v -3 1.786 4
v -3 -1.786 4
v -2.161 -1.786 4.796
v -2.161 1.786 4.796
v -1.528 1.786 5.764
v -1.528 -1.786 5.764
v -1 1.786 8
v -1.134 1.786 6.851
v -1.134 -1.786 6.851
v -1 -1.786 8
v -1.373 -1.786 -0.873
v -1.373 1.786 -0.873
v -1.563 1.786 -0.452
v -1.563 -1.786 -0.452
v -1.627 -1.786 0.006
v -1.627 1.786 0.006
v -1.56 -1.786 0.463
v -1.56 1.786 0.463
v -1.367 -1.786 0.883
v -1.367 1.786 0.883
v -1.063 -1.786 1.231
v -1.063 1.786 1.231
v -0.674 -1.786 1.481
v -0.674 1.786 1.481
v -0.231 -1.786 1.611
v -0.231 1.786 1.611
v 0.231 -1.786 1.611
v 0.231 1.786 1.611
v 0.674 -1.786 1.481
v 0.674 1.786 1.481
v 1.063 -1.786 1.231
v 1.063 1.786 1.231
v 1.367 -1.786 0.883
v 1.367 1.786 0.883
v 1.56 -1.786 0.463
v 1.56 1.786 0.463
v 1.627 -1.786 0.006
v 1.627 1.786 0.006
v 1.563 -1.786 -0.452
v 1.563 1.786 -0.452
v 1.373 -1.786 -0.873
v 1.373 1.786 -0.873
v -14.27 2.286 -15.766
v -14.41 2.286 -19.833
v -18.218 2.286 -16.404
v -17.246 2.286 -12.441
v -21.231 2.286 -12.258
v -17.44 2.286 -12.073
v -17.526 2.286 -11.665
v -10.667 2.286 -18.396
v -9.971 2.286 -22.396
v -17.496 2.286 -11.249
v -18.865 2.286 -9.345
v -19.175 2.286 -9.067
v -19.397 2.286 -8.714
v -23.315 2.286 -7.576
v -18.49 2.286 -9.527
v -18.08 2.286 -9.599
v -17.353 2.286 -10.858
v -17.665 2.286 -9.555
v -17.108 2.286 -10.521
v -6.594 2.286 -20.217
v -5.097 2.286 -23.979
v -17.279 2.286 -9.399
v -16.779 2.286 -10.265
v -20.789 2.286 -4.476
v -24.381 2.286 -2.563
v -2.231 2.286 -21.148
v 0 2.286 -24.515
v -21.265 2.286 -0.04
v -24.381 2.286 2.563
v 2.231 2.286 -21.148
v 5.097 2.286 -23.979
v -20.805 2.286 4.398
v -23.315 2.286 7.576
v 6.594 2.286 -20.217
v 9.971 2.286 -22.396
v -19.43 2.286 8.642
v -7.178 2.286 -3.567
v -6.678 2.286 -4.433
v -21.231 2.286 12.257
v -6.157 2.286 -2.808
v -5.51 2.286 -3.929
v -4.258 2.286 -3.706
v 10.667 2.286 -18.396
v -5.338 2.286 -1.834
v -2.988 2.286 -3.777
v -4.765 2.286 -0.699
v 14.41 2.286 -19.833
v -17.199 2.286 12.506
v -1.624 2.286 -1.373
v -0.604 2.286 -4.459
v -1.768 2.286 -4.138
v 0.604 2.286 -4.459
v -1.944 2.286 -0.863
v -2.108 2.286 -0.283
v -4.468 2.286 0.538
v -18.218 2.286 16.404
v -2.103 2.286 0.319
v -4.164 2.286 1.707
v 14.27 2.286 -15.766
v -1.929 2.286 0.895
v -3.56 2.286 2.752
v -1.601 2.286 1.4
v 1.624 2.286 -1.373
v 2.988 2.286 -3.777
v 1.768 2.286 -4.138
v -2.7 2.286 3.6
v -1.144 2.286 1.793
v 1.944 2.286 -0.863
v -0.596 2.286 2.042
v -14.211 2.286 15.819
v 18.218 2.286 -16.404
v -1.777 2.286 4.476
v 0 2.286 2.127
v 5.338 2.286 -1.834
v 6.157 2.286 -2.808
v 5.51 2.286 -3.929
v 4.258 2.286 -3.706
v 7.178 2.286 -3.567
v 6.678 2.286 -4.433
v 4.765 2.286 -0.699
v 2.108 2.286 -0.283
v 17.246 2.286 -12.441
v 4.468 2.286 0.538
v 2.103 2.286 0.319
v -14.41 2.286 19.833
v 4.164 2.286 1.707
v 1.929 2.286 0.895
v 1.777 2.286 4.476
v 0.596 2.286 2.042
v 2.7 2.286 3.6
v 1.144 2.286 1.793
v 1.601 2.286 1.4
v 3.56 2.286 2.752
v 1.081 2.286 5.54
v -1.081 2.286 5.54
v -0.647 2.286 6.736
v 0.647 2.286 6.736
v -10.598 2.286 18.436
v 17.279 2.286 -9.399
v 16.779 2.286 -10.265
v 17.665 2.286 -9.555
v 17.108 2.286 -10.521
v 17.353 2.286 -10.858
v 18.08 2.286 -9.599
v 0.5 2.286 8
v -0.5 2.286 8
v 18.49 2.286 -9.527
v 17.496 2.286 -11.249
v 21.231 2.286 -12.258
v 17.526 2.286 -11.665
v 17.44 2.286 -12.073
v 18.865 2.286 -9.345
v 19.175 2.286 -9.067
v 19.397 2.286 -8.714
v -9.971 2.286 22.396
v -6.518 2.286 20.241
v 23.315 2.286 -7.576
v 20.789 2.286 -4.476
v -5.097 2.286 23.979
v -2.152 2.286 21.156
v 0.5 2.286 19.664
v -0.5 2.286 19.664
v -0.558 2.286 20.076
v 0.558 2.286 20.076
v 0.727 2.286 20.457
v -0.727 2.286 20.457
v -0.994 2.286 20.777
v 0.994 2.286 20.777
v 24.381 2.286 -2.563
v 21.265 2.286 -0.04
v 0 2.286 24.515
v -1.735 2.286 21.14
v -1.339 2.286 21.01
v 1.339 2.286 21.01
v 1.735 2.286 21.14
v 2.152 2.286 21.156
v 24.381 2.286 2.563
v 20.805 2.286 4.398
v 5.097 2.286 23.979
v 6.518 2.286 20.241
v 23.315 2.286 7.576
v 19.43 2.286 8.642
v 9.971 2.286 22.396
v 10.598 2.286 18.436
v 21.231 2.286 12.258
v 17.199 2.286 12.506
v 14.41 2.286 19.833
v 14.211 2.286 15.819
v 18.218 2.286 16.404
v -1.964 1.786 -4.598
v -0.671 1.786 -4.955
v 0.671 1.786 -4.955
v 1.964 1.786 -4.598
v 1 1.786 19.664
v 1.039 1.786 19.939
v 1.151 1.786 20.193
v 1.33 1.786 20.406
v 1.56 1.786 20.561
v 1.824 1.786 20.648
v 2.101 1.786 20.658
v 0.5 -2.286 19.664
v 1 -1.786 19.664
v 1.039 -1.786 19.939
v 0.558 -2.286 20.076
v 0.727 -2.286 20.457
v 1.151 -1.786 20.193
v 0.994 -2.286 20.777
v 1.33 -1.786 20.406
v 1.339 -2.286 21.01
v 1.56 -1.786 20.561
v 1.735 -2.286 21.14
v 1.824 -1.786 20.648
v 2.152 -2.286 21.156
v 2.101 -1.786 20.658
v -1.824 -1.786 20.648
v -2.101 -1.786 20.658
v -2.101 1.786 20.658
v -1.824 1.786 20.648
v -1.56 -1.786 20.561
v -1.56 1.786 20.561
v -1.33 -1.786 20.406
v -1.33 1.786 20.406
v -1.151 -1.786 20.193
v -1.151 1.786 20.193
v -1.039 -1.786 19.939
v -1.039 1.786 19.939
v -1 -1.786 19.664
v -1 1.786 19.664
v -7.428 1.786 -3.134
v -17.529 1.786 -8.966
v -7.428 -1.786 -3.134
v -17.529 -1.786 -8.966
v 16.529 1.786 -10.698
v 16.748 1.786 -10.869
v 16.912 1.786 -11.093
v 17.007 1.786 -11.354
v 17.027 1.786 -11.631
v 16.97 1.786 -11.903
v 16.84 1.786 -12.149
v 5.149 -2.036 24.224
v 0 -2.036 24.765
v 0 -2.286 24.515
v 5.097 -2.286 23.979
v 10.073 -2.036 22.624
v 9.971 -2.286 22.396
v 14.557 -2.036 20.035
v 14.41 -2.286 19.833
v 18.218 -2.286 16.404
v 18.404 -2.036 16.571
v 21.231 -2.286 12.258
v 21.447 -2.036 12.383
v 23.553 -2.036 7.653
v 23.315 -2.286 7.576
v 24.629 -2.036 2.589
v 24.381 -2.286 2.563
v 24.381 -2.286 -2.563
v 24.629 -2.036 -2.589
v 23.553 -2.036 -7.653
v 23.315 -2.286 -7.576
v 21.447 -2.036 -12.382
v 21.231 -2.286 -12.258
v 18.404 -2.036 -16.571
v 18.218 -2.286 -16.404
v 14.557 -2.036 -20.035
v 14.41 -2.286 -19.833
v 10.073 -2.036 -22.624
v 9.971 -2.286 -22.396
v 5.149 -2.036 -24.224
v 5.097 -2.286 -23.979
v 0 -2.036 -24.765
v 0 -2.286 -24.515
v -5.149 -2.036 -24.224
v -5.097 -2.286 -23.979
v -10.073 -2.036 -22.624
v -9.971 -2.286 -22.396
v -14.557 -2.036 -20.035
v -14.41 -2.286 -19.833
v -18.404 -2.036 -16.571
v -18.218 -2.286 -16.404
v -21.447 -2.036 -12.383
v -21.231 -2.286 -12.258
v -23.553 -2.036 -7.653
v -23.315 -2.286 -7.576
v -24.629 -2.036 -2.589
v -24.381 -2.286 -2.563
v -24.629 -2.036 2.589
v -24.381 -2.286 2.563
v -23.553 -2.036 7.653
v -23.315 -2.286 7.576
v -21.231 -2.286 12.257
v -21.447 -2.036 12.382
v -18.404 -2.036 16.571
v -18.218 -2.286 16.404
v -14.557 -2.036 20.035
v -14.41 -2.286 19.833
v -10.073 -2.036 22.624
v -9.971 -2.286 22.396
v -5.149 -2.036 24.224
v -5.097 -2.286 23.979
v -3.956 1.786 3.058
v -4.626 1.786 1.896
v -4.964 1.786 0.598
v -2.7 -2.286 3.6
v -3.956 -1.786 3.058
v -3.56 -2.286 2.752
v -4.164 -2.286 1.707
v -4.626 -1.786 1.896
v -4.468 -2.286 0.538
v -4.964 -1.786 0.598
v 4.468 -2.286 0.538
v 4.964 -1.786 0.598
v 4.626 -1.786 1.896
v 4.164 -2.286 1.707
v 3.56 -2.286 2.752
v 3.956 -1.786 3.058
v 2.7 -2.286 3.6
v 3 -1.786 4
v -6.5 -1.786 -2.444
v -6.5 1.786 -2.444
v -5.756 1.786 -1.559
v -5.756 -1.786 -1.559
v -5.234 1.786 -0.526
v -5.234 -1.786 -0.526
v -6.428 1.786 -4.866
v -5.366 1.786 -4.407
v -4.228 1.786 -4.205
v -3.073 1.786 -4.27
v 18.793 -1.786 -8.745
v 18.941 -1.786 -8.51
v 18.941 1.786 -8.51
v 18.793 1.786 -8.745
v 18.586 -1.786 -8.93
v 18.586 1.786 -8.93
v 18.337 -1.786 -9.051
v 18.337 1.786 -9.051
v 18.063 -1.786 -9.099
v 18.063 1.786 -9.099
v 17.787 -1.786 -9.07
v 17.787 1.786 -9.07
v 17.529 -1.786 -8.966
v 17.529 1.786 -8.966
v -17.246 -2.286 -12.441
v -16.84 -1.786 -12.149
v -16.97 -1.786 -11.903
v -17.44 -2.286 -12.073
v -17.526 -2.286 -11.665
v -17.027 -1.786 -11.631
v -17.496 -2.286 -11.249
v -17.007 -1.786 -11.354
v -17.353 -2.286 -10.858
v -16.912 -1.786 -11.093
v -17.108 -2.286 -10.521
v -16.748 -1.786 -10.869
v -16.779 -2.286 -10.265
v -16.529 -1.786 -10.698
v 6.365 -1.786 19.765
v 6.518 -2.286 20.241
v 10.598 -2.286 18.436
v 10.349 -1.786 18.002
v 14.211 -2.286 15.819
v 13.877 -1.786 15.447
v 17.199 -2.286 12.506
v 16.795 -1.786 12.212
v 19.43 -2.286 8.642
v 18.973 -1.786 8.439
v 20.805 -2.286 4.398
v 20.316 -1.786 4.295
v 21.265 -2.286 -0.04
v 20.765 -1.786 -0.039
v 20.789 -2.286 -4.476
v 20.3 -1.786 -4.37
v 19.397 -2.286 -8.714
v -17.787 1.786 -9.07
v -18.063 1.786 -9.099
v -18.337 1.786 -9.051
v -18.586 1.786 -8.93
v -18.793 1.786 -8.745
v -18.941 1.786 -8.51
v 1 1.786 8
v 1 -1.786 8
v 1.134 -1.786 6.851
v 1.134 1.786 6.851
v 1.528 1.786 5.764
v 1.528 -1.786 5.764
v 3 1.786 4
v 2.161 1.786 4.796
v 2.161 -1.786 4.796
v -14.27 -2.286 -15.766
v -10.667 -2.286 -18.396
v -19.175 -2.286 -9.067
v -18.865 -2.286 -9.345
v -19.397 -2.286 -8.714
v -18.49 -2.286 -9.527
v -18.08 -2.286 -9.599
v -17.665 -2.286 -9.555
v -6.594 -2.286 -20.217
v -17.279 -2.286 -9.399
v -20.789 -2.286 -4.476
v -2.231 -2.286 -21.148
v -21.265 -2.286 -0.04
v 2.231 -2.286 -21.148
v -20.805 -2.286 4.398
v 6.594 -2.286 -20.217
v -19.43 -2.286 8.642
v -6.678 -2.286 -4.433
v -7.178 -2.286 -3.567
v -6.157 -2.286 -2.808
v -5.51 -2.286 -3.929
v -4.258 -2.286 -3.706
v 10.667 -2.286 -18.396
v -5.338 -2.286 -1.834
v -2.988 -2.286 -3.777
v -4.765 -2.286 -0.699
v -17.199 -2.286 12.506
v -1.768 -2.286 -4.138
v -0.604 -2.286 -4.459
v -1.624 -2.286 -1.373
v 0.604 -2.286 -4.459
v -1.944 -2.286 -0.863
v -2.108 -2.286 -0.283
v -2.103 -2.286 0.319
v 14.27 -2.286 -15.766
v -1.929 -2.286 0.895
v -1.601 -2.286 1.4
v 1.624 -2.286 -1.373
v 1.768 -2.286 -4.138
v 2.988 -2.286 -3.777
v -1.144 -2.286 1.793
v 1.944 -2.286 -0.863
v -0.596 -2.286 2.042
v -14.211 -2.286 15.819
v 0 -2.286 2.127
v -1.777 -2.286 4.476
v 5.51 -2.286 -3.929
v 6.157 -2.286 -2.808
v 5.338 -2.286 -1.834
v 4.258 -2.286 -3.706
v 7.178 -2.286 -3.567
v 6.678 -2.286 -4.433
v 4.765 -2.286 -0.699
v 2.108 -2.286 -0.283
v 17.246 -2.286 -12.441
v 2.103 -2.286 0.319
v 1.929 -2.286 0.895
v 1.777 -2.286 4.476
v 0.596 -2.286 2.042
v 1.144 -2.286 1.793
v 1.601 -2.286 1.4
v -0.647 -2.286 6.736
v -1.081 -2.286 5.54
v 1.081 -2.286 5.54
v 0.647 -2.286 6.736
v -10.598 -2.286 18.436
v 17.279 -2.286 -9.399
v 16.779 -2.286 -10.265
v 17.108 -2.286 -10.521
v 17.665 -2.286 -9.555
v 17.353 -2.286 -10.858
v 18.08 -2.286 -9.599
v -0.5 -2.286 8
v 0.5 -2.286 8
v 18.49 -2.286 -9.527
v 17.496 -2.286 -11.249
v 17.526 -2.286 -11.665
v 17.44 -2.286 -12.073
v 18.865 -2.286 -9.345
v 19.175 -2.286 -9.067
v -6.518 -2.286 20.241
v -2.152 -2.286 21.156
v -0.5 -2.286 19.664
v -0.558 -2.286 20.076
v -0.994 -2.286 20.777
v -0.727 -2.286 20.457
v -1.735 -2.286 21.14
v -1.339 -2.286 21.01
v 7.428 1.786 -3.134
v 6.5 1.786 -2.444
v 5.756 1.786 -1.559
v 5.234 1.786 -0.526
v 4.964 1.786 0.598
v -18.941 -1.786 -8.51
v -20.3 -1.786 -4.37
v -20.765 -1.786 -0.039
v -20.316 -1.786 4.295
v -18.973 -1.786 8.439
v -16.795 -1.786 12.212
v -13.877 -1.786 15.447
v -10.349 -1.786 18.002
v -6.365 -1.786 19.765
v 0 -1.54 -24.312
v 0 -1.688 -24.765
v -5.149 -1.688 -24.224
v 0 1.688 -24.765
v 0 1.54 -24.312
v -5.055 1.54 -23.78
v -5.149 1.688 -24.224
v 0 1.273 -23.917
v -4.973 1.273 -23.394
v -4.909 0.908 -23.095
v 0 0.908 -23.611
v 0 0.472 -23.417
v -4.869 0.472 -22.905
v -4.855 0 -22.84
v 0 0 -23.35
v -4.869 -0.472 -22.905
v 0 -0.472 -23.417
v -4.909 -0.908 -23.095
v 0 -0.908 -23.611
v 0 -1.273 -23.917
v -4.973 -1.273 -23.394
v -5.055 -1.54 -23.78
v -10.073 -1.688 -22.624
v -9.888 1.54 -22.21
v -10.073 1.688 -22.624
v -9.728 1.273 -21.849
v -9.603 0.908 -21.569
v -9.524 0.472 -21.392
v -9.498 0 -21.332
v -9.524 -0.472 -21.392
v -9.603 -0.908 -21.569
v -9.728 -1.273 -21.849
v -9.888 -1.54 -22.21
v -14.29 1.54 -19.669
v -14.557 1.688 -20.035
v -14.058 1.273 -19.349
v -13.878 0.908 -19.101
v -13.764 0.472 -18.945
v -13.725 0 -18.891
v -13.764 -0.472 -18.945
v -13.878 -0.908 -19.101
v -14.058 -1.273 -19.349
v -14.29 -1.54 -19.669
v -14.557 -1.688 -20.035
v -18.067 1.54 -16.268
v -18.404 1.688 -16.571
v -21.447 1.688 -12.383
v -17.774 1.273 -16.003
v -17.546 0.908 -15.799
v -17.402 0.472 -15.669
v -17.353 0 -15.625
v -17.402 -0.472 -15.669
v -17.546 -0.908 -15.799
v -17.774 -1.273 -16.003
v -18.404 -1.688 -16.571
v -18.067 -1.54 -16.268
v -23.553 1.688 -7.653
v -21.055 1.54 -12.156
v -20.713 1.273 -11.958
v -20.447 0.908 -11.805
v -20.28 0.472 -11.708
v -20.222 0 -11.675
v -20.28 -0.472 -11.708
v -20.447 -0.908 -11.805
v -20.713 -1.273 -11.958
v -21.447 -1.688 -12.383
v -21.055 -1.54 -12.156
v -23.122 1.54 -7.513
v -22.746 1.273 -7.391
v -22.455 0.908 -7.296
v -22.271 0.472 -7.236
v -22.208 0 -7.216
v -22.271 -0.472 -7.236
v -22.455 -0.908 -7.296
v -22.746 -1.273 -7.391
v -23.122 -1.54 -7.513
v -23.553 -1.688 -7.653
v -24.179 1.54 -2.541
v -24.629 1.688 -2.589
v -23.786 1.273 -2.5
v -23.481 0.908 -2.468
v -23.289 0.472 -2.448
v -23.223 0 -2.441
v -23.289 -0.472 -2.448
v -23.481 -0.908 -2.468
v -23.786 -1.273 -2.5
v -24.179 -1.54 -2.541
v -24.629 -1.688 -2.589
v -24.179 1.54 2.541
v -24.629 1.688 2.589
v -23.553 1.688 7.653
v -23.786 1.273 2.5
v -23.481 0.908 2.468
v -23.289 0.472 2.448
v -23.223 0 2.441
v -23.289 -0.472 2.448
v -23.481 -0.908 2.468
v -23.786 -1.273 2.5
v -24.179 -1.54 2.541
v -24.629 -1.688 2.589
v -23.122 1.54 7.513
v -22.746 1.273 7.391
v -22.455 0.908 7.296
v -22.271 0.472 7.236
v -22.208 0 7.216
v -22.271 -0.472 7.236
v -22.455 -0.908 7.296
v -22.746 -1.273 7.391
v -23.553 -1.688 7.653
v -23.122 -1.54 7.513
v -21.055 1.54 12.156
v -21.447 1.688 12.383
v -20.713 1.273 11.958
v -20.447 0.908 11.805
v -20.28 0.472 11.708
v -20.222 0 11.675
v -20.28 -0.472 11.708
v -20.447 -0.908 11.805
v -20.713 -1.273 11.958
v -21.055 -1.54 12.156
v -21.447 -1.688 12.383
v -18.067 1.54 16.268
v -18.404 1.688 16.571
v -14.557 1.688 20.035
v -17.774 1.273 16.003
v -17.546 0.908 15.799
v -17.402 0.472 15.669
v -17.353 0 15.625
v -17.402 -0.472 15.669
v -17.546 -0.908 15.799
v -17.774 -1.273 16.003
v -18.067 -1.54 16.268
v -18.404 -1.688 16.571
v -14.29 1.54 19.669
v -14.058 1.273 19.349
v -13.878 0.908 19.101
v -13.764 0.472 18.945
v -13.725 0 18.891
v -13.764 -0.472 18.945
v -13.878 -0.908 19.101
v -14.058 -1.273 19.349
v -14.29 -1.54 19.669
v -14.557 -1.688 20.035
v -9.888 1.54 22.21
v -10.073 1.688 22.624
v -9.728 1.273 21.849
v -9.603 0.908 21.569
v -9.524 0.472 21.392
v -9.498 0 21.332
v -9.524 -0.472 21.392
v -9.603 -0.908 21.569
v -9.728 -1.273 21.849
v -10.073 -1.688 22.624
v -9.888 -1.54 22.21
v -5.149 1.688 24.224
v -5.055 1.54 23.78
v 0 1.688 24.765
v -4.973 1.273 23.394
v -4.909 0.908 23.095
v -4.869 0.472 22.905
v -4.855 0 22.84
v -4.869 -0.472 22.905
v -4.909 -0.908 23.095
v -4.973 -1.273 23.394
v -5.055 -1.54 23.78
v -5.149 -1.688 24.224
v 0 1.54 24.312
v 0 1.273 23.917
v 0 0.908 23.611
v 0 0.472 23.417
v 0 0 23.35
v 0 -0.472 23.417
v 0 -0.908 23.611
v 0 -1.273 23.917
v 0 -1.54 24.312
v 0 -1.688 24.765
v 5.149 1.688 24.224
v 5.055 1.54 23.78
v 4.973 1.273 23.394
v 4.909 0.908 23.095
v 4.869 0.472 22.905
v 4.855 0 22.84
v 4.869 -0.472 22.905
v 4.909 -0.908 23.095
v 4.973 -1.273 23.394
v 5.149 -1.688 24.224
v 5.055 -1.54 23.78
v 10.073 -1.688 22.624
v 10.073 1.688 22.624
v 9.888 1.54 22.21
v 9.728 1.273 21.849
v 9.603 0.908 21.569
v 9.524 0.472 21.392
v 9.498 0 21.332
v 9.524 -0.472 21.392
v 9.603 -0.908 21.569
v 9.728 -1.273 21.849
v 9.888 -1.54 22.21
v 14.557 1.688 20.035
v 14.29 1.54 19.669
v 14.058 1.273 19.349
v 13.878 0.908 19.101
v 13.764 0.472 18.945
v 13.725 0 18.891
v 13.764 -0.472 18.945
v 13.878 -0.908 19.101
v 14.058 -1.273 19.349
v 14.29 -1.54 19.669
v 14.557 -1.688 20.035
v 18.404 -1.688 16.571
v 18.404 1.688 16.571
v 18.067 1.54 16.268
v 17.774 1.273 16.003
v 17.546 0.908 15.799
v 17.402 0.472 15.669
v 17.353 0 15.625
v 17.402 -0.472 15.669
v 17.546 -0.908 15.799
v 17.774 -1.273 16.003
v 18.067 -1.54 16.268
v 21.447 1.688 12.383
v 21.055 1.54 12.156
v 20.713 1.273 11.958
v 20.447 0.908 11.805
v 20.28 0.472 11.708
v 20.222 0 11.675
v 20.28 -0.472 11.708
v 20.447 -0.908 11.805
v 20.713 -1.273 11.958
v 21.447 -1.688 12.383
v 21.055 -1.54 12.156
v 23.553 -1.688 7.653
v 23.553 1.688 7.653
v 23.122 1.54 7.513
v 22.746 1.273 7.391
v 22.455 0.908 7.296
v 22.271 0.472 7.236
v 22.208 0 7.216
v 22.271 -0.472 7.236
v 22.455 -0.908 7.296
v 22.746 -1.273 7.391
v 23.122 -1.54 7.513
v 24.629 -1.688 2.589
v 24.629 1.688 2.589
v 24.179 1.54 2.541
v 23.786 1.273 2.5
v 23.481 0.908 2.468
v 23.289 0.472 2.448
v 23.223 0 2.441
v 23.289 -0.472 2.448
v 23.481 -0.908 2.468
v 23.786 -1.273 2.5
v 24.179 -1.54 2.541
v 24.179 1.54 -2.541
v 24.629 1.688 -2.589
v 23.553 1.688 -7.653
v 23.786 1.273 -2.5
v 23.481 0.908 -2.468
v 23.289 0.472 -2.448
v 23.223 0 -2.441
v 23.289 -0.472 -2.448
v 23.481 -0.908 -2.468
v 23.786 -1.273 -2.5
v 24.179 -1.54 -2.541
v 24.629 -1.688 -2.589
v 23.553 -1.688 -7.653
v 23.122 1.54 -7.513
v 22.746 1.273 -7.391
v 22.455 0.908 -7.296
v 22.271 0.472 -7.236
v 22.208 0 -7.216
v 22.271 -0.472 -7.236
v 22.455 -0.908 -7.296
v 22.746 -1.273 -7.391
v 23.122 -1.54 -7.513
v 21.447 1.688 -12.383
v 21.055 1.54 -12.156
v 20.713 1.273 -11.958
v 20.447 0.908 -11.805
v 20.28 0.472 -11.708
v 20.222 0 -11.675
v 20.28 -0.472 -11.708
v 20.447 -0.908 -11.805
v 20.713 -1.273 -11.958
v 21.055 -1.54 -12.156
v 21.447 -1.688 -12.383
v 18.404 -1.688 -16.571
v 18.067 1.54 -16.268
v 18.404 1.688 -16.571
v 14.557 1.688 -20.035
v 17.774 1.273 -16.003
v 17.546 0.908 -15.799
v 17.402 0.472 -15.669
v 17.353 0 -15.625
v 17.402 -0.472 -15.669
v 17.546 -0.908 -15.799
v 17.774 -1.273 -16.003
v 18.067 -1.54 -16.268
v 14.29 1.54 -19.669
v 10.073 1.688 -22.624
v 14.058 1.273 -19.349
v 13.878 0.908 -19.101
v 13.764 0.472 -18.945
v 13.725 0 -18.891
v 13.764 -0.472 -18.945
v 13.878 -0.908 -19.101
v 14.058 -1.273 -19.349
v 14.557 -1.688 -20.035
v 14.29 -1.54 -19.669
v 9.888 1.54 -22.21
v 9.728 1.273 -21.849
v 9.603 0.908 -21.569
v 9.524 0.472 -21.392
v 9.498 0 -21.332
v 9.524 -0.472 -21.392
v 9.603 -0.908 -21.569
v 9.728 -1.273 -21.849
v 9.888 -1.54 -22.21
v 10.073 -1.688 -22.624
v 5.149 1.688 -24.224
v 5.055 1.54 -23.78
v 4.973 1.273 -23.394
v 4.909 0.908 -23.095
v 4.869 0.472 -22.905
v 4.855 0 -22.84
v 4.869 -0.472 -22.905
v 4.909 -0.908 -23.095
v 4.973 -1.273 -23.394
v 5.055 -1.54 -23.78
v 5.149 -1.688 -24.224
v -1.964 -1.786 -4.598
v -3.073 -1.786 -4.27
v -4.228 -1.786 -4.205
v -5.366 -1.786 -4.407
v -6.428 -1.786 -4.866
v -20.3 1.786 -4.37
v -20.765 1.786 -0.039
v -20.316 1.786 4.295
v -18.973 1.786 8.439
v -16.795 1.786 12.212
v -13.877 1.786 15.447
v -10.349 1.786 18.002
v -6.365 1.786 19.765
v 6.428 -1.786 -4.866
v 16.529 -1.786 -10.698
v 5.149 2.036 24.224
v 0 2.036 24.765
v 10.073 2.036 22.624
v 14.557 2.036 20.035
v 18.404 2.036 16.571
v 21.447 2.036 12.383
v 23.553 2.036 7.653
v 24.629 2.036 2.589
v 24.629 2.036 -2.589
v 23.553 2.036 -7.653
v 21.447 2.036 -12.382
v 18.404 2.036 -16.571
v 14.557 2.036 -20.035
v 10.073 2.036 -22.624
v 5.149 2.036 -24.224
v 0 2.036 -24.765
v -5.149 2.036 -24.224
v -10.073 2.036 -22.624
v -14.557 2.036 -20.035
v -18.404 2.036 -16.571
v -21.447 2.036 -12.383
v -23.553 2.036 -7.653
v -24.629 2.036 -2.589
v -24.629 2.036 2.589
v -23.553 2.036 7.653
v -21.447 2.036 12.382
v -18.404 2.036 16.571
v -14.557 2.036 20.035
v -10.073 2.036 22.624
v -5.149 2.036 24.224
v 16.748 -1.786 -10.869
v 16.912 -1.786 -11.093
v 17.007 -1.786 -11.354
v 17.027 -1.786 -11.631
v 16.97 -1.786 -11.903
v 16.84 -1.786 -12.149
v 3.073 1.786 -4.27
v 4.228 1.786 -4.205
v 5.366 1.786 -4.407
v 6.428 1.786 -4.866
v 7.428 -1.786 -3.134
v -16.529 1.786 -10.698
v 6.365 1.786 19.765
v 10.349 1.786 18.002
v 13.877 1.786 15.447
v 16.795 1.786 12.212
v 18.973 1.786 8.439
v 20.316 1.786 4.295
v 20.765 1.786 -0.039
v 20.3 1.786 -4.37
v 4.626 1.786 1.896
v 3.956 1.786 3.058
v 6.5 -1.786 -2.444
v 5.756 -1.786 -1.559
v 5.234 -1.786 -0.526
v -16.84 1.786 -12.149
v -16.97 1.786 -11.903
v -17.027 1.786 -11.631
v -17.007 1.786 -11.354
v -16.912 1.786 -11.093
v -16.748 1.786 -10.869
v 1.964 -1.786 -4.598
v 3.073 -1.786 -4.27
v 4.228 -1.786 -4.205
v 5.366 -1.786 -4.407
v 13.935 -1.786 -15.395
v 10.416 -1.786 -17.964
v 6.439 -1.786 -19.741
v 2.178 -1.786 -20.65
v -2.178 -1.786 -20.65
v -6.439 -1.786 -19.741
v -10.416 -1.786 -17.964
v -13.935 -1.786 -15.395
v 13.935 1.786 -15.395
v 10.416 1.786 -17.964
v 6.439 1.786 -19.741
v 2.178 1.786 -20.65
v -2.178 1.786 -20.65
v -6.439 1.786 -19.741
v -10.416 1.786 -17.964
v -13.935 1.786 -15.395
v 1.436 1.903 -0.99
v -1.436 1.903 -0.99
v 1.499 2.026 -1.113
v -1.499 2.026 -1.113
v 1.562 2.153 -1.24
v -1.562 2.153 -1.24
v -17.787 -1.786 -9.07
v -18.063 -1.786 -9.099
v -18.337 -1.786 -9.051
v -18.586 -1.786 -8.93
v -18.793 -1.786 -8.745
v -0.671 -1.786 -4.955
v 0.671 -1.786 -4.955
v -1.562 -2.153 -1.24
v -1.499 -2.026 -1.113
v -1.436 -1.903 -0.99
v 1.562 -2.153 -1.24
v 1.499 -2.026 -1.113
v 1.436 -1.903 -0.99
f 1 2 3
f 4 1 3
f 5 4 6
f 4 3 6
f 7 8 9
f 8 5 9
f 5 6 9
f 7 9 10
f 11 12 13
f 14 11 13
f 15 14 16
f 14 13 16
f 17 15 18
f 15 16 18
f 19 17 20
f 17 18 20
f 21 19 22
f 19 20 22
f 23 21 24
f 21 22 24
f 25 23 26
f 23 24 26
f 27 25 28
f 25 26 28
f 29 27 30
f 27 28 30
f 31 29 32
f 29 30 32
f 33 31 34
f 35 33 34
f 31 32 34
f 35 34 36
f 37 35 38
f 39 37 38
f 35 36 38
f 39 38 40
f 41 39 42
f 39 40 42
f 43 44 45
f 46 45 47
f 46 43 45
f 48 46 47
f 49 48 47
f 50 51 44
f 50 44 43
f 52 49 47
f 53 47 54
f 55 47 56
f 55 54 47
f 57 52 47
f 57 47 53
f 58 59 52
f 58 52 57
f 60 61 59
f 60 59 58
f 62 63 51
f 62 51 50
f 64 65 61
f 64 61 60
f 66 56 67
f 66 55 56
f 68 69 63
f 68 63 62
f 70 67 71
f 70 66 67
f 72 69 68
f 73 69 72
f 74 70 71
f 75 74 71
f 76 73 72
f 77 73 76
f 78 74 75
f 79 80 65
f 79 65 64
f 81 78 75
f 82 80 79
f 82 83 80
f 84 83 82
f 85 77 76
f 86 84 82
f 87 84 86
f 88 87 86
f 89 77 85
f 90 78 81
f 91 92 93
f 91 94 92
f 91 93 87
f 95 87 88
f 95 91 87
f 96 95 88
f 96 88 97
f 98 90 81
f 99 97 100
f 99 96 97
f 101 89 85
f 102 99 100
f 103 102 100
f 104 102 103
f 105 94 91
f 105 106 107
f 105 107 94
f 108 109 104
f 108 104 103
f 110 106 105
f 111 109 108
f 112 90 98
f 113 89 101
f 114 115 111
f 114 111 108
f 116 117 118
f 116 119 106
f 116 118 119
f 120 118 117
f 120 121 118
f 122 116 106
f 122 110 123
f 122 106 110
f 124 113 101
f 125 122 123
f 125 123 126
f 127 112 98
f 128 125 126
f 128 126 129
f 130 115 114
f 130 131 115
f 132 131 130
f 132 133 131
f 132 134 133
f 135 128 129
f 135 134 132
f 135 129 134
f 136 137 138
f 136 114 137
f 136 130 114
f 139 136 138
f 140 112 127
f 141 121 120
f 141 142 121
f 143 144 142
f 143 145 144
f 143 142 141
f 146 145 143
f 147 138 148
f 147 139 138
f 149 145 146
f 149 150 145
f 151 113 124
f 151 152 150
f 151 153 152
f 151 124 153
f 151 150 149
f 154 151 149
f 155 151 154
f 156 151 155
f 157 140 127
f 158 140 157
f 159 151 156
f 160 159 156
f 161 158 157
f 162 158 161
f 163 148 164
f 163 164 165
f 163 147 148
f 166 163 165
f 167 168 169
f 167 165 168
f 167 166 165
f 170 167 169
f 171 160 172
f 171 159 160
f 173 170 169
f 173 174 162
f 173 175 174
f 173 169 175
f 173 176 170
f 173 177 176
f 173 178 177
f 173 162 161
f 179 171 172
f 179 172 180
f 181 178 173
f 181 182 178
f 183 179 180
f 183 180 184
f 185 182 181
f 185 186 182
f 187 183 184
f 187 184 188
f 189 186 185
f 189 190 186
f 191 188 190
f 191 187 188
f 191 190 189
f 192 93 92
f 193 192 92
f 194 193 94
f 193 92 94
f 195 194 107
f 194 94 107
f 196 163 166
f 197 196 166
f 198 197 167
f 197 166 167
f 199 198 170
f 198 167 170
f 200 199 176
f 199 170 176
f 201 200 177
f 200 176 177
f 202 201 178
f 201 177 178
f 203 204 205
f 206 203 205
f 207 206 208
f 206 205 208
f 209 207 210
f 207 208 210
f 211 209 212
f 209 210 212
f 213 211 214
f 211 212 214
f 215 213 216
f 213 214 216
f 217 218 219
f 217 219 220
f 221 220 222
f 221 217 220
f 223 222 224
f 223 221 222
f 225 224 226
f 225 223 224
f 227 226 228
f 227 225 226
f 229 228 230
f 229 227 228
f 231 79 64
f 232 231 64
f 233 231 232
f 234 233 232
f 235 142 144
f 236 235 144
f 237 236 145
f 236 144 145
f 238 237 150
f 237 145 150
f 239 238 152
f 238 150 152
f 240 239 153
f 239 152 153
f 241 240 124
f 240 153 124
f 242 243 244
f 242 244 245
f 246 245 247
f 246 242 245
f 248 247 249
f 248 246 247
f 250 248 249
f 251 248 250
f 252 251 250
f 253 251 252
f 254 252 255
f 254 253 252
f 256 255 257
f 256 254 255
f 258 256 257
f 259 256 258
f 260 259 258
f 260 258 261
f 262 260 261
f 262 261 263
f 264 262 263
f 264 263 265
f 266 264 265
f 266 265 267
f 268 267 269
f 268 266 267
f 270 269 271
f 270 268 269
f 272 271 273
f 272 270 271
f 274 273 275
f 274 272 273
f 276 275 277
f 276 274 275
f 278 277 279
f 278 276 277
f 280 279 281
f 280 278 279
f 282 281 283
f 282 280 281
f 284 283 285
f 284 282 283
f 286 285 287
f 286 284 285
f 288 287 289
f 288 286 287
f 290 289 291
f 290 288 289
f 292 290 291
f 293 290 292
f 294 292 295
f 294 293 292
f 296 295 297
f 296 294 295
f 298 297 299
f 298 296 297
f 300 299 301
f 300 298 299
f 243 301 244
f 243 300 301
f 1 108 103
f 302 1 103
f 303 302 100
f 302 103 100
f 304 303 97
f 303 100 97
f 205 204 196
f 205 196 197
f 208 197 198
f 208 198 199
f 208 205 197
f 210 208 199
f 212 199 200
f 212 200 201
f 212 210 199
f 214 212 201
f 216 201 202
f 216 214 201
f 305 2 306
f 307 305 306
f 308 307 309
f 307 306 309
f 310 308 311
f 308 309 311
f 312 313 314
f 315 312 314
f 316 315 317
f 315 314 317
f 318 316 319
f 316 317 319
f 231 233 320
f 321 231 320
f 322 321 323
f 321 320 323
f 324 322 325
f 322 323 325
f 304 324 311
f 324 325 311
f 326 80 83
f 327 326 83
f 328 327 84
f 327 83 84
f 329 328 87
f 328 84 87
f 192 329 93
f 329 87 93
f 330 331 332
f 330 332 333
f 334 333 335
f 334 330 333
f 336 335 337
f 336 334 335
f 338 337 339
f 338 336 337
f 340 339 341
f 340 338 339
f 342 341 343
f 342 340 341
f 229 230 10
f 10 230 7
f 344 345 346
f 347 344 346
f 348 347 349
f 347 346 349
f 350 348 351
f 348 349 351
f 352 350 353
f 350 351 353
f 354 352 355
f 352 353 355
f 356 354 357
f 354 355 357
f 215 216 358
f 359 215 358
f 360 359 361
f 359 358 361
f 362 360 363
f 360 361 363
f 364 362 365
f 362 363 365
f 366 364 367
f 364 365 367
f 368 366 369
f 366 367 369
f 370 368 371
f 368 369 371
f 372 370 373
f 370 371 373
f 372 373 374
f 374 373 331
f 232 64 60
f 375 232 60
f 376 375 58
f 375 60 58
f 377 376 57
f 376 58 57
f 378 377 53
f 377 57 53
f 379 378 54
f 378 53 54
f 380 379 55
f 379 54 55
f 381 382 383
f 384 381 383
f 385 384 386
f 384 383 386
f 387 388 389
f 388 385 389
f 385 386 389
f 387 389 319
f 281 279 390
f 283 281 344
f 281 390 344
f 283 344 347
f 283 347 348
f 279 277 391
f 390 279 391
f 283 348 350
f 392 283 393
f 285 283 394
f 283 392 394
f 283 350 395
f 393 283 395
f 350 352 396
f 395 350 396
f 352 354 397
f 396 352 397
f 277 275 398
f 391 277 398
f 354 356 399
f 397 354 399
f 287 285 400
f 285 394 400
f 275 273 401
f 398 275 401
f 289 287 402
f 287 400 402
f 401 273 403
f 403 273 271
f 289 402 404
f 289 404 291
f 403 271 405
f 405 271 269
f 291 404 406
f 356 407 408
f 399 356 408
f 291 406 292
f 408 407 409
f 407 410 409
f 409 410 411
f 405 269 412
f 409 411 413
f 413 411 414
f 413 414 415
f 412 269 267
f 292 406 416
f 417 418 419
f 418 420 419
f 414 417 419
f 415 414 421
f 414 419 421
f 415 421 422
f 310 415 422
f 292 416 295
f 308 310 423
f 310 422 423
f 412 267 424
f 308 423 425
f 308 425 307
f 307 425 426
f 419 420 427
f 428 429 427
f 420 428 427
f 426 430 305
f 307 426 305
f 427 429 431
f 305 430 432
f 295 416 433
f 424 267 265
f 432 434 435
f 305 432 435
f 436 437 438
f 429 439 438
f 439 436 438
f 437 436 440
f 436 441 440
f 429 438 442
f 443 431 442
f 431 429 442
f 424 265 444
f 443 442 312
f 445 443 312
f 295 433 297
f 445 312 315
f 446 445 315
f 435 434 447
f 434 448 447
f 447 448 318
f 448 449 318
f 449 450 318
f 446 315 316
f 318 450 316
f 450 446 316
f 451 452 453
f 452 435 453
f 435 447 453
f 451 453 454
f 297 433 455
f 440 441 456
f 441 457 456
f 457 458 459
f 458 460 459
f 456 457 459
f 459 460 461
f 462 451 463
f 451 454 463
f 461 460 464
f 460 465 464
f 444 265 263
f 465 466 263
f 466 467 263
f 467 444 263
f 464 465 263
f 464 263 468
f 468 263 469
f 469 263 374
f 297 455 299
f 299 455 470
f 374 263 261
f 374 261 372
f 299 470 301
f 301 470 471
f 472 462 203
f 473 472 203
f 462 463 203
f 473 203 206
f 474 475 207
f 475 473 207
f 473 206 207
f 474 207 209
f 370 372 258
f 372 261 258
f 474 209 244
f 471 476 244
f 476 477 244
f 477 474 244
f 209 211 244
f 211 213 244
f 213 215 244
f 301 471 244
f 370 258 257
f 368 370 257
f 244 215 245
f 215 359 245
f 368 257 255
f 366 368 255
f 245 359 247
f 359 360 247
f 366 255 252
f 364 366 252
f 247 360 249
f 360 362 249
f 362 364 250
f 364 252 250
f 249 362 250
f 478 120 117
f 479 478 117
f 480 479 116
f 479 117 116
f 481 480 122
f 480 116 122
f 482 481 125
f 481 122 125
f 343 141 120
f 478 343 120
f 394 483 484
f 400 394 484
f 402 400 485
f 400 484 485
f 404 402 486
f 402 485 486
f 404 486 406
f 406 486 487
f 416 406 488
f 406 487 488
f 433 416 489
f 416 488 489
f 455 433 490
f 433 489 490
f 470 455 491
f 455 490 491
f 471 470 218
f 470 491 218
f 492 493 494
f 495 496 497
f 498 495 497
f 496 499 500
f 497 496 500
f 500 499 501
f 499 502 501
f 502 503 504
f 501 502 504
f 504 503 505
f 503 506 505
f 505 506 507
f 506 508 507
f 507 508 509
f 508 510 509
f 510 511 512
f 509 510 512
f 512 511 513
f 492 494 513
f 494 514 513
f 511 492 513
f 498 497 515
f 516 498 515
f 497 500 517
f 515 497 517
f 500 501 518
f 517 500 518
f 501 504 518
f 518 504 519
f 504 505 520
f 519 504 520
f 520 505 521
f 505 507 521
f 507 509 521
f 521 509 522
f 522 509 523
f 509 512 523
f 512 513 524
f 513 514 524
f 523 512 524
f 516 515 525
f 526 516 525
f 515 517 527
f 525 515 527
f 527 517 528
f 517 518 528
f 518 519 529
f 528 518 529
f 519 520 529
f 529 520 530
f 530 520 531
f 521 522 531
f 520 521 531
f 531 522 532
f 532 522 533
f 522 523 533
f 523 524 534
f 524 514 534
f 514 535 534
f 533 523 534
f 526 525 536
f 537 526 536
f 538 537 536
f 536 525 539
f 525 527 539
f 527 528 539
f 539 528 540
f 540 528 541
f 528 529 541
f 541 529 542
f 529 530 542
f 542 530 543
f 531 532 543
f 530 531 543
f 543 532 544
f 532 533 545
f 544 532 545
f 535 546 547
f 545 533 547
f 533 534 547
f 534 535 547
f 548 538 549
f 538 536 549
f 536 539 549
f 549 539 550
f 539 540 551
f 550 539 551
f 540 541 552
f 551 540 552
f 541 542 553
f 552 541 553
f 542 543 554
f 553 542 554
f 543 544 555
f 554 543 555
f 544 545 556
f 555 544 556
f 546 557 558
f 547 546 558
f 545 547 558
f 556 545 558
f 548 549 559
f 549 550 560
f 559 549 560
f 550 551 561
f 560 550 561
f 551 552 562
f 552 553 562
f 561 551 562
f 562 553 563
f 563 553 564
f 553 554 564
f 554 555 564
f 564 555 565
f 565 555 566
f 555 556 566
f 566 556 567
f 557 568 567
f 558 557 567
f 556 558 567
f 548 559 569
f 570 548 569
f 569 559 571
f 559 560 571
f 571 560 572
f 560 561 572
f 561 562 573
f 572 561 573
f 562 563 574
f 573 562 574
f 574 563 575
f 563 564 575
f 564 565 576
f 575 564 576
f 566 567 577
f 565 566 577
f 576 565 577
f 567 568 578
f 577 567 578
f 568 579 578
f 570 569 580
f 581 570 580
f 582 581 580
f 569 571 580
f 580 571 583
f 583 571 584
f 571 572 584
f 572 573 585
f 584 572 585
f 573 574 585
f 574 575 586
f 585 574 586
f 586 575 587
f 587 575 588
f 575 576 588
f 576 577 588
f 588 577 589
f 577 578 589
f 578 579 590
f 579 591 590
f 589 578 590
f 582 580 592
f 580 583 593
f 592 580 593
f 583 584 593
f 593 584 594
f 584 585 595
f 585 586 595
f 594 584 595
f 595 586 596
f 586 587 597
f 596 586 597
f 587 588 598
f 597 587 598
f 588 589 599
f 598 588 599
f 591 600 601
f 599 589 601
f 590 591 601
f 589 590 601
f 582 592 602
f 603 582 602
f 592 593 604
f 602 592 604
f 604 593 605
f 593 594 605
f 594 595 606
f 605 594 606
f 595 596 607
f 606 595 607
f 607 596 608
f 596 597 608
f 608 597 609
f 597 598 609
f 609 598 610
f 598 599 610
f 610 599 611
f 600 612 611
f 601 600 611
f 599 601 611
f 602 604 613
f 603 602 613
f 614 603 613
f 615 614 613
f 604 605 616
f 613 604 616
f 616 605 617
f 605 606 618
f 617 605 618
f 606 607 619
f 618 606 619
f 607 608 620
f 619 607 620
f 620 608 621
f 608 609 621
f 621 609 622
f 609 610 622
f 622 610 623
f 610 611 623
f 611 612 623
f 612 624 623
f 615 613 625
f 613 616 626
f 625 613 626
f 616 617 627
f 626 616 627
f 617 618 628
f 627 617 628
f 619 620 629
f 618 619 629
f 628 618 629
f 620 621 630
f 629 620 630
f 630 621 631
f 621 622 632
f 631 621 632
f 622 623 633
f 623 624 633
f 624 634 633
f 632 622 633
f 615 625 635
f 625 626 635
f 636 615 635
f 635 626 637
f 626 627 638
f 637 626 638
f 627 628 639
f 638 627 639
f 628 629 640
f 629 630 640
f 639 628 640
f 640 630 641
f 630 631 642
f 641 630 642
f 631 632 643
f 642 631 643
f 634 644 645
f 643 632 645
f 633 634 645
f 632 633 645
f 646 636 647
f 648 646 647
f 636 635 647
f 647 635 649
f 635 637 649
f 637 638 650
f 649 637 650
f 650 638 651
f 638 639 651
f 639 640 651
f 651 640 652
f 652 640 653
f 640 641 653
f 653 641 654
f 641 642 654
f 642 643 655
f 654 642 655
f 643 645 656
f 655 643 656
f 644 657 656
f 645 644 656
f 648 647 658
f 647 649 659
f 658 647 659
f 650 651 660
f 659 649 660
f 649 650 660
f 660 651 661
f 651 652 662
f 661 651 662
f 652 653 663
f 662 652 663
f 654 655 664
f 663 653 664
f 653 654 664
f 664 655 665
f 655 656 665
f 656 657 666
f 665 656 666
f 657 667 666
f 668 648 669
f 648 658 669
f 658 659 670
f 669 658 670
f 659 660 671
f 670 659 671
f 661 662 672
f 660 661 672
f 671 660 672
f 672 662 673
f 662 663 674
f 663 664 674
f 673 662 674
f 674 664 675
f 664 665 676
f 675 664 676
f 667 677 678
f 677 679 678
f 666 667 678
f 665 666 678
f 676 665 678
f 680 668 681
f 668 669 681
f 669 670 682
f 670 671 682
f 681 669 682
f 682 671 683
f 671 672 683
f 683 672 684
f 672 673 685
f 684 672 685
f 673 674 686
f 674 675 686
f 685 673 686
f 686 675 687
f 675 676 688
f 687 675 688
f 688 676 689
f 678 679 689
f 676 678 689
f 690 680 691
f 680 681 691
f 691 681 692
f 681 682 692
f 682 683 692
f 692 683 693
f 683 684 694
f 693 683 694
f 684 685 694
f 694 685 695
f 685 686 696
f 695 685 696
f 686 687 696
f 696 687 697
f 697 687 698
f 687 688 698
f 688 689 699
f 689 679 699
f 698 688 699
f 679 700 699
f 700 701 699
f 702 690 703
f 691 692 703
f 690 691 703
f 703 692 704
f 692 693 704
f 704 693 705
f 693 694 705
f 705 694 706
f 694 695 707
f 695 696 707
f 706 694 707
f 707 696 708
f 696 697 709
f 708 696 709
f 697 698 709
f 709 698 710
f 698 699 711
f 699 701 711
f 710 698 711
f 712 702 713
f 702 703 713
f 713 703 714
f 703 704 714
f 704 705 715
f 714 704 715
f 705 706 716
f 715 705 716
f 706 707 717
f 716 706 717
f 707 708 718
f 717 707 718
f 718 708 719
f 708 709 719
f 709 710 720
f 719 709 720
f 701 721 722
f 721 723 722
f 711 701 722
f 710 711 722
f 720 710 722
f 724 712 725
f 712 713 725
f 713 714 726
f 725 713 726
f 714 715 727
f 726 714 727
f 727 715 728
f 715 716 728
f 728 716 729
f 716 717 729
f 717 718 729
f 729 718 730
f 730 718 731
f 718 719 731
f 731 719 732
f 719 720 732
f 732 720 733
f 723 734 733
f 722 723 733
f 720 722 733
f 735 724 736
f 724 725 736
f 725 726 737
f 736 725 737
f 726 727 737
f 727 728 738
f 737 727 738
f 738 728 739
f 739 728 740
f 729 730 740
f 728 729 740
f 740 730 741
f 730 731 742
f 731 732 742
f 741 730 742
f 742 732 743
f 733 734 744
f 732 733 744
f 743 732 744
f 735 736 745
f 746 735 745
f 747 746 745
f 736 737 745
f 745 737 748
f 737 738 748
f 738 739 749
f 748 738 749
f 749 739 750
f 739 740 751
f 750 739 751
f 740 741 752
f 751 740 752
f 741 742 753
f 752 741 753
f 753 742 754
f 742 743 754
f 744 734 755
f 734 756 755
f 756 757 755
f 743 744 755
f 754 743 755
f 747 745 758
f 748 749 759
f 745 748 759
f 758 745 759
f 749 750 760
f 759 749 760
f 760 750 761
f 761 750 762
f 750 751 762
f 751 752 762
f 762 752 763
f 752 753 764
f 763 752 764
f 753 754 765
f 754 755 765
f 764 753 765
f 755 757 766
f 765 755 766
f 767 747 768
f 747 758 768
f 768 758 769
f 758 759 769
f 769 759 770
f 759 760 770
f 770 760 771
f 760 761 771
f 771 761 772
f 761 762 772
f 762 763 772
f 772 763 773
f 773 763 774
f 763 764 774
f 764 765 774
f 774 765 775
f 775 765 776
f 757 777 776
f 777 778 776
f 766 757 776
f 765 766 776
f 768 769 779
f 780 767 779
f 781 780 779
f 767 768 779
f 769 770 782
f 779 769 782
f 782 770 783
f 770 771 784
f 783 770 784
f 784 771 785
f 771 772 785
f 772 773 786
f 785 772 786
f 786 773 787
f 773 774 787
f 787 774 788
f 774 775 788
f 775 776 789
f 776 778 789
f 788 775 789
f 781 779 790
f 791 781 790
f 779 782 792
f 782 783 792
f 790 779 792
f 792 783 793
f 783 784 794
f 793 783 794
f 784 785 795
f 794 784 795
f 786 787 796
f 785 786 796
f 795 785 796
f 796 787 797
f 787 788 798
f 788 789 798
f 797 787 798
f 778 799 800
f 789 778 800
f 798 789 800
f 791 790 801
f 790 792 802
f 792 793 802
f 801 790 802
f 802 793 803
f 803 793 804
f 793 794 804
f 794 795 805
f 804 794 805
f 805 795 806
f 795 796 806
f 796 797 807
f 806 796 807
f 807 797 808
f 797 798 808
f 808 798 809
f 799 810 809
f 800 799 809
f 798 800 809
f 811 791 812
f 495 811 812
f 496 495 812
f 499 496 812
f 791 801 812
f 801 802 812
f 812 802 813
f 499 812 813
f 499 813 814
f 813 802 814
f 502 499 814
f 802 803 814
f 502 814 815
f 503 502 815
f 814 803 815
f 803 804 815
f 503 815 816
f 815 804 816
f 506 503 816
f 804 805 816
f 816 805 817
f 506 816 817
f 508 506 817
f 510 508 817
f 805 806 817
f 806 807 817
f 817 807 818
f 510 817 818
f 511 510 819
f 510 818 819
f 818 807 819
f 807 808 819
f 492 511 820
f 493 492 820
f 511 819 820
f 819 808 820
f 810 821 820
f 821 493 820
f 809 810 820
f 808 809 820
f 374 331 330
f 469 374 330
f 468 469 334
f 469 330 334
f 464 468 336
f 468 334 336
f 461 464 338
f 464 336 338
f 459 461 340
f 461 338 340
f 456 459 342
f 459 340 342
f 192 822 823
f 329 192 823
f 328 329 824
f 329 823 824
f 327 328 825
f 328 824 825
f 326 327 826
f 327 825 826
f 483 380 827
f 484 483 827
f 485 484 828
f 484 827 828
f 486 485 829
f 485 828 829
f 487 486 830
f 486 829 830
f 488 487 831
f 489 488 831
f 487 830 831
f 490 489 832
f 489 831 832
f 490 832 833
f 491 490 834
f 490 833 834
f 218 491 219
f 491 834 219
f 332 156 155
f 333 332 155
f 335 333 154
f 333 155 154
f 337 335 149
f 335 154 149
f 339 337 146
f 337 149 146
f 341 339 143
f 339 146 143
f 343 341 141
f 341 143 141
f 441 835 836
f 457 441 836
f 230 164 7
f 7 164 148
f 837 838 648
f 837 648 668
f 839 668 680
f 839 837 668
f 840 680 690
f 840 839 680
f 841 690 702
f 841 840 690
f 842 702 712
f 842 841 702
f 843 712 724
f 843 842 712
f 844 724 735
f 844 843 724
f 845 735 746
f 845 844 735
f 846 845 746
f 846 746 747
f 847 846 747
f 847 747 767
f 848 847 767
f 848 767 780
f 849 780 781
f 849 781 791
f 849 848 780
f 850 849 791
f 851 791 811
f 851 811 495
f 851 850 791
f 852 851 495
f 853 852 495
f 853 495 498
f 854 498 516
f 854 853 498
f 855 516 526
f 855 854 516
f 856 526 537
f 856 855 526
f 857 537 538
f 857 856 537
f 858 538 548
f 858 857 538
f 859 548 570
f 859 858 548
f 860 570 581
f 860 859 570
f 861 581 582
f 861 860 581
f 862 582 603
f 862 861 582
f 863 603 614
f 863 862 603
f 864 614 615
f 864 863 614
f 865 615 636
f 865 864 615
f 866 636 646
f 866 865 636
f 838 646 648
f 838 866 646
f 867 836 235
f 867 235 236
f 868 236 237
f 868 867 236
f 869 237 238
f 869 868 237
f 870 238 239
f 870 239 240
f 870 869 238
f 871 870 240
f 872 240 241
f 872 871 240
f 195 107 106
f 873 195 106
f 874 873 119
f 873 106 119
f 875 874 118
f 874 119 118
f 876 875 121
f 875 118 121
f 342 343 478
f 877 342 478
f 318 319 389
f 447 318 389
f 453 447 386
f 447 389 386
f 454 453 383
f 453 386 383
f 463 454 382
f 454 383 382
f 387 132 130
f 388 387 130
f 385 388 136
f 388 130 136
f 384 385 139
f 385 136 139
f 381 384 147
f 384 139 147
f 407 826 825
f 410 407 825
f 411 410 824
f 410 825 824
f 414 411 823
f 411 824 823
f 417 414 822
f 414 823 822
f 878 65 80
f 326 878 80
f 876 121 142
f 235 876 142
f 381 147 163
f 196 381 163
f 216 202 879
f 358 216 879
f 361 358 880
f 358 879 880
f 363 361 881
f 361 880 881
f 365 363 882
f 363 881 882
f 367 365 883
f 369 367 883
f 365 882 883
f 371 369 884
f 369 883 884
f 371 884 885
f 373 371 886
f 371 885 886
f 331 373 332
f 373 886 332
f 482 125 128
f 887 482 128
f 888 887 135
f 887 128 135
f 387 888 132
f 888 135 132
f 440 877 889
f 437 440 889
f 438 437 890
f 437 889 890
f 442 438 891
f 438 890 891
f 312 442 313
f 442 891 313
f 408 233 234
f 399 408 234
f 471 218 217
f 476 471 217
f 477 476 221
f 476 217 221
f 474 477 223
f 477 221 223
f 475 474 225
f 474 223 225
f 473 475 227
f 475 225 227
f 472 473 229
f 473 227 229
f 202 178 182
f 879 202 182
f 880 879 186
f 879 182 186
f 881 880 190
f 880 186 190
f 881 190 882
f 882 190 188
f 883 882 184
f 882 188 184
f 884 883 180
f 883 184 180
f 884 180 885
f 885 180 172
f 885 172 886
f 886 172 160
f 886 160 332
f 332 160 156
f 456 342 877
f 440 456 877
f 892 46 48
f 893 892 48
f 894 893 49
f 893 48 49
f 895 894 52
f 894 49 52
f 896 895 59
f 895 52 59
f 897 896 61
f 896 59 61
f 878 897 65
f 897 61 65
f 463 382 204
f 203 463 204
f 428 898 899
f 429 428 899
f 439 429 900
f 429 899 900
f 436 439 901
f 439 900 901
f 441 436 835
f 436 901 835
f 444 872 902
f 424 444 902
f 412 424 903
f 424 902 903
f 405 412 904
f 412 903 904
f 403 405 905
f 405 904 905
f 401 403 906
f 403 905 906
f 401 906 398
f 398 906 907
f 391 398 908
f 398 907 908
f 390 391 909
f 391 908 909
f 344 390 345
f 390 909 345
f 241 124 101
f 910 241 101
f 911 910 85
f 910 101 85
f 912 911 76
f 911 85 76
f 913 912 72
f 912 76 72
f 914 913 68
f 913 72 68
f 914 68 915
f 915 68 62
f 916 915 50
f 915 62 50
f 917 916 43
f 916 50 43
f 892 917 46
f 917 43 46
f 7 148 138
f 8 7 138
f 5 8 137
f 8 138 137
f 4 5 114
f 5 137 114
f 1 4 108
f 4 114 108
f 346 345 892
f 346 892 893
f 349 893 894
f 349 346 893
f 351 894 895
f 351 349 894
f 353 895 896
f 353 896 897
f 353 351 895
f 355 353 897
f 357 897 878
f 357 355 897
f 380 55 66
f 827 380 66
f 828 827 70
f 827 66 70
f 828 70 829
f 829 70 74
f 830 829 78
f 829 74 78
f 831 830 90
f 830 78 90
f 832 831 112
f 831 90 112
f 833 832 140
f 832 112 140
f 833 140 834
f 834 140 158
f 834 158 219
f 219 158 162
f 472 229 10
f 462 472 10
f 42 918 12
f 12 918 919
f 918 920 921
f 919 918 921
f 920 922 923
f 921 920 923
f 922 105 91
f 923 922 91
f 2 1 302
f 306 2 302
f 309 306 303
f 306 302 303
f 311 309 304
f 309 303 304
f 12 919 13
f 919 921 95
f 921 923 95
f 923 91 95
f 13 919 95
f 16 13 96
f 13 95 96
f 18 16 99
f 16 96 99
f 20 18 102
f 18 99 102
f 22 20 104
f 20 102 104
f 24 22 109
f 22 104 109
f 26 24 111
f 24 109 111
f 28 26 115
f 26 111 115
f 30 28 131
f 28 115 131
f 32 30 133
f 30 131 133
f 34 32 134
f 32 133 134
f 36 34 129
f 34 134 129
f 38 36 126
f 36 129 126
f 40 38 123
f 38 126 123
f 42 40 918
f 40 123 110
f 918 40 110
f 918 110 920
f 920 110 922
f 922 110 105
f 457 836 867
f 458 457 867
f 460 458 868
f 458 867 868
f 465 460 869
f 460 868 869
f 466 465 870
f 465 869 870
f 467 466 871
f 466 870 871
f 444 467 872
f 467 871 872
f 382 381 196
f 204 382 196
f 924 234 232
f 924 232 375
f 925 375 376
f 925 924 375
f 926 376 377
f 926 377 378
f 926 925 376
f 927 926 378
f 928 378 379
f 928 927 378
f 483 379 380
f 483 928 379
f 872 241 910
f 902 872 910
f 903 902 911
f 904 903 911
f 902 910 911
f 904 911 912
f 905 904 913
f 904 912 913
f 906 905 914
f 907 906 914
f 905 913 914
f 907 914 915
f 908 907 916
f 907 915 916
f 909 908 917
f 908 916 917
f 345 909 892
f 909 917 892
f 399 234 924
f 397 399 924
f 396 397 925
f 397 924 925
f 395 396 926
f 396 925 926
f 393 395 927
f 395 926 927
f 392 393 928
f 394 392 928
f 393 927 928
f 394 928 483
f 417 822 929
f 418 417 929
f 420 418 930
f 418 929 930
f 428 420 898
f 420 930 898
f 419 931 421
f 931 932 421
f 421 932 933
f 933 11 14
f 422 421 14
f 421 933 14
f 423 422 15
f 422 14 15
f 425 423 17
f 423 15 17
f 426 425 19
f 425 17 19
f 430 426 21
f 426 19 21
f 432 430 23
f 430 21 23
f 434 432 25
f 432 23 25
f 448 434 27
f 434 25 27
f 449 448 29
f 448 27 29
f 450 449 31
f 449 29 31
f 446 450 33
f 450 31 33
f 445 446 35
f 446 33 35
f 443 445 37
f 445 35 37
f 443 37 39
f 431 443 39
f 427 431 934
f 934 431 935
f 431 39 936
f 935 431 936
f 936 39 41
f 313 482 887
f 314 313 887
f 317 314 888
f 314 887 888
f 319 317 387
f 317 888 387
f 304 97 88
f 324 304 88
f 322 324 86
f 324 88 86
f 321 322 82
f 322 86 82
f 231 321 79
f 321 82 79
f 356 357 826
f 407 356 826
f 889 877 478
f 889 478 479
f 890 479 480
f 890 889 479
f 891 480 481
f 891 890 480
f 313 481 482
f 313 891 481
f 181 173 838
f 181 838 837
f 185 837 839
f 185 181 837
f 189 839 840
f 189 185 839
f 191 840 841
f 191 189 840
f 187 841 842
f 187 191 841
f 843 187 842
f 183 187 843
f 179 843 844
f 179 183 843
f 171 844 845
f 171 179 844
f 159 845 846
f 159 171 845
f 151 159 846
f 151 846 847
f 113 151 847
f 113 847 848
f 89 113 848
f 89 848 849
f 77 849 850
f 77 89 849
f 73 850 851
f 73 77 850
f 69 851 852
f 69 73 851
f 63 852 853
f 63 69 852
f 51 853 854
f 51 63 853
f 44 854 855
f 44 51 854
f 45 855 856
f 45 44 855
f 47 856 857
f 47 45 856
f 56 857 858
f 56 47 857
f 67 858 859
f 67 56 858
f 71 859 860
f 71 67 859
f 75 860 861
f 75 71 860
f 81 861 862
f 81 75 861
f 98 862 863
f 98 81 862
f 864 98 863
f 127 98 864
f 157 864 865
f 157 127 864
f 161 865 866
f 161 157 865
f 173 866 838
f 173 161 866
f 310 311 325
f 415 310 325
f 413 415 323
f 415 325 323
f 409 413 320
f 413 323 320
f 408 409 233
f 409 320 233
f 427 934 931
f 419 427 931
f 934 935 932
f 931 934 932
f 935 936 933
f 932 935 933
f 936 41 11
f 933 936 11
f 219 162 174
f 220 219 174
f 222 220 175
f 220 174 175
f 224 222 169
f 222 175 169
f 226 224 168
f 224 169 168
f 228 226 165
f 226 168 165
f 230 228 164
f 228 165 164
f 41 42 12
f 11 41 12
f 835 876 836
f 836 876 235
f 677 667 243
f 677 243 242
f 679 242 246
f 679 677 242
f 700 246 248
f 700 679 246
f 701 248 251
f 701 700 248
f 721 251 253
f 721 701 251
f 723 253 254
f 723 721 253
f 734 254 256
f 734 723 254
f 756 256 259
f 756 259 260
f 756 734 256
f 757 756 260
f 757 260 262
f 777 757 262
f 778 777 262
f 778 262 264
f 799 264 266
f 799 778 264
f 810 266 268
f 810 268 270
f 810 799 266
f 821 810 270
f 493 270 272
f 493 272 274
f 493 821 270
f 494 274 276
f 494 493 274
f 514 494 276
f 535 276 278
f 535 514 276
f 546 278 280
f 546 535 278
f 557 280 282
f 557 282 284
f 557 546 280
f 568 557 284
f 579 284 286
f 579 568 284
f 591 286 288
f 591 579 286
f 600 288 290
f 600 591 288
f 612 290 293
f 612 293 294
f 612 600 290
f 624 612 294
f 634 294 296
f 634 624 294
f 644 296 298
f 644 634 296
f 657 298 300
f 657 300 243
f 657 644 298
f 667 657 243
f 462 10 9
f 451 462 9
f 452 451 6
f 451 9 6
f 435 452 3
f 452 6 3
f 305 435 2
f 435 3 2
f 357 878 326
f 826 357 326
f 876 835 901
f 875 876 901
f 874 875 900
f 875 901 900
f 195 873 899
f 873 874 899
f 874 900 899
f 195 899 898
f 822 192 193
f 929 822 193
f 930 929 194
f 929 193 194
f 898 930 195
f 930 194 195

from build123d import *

# Parameters (mm, degrees)
SKETCH1_R           = 24.765
BOSS_EXTRUDE1_DEPTH = 2.286
SKETCH2_R           = 1.7145
CUT_EXTRUDE1_DEPTH  = 36.320159031
CUT_EXTRUDE2_DEPTH  = 36.320159031
CIRPATTERN1_COUNT   = 3
FILLET1_R           = 5
FILLET4_R           = 1
CHAMFER1_SIZE       = 0.5
CHAMFER2_SIZE       = 0.5
CHAMFER3_SIZE       = 0.25


with BuildPart() as part:
    # Sketch1 → Boss-Extrude1 (new, symmetric)
    with BuildSketch(Plane(origin=(0, 0, 0), x_dir=(1, 0, 0), z_dir=(0, 1, 0))):
        with Locations(Location((0, 0, 0), (0, 0, 270))):
            Circle(SKETCH1_R)
    extrude(amount=BOSS_EXTRUDE1_DEPTH, both=True)

    # Sketch2 → Cut-Revolve1 (revolve, cut)
    with BuildSketch(Plane(origin=(0, 0, 0), x_dir=(0, 0, -1), z_dir=(1, 0, 0))):
        with Locations((25.065, 0)):
            Circle(SKETCH2_R)
    revolve(axis=Axis((0, 0, 0), (0, 1, 0)), mode=Mode.SUBTRACT)

    # Sketch3 → Cut-Extrude1 (cut, through all)
    with BuildSketch(Plane(origin=(0, 2.286, 0), x_dir=(1, 0, 0), z_dir=(0, 1, 0))):
        with BuildLine():
            Line((1.372953022, 0.873), (-1.372953022, 0.873))
            ThreePointArc((-1.372953022, 0.873), (0, -1.627), (1.372953022, 0.873))
        make_face()
    extrude(amount=-CUT_EXTRUDE1_DEPTH, mode=Mode.SUBTRACT)

    # Sketch4 → Cut-Extrude2 (cut, through all)
    with BuildSketch(Plane(origin=(0, 2.286, 0), x_dir=(1, 0, 0), z_dir=(0, 1, 0))):
        with BuildLine():
            Line((3.742640687, 3.315515147), (17.462152397, 11.236478926))
            ThreePointArc((17.462152397, 11.236478926), (0, 20.765), (-17.462152397, 11.236478926))
            Line((-17.462152397, 11.236478926), (-3.742640687, 3.315515147))
            ThreePointArc((-3.742640687, 3.315515147), (0, 5), (3.742640687, 3.315515147))
        make_face()
    cut_extrude2 = extrude(amount=-CUT_EXTRUDE2_DEPTH, mode=Mode.SUBTRACT)

    # CirPattern1: Cut-Extrude2 ×3 about axis
    cirpattern1_axis = Axis((0, 0, 0), (0, 1, 0))
    for i in range(1, CIRPATTERN1_COUNT):
        add(cut_extrude2.rotate(cirpattern1_axis, i * 360 / CIRPATTERN1_COUNT), mode=Mode.SUBTRACT)

    # Fillet1
    fillet1_edges = [part.edges().sort_by_distance(p)[0] for p in [
        (3.742640687, 0, -3.315515147),
        (-3.742640687, 0, -3.315515147),
        (1, 0, 4.898979486),
        (4.742640687, 0, -1.583464339),
        (-4.742640687, 0, -1.583464339),
        (-1, 0, 4.898979486),
    ]]
    fillet(fillet1_edges, radius=FILLET1_R)

    # Fillet4
    fillet4_edges = [part.edges().sort_by_distance(p)[0] for p in [
        (-17.462152397, 0, -11.236478926),
        (17.462152397, 0, -11.236478926),
        (18.462152397, 0, -9.504428118),
        (1, 0, 20.740907044),
        (-1, 0, 20.740907044),
        (-18.462152397, 0, -9.504428118),
    ]]
    fillet(fillet4_edges, radius=FILLET4_R)

    # Chamfer1
    chamfer1_edges = [part.edges().sort_by_distance(p)[0] for p in [
        (0, -2.286, -0.873),
        (0, -2.286, 1.627),
        (0, 2.286, -0.873),
        (0, 2.286, 1.627),
    ]]
    chamfer(chamfer1_edges, length=CHAMFER1_SIZE)

    # Chamfer2
    chamfer2_edges = [part.edges().sort_by_distance(p)[0] for p in [
        (12.47866882, 2.286, -6.049862264),
        (12.47866882, -2.286, -6.049862264),
        (17.98301751, 2.286, 10.3825),
        (17.98301751, -2.286, 10.3825),
        (-17.98301751, 2.286, 10.3825),
        (-17.98301751, -2.286, 10.3825),
        (-11.47866882, 2.286, -7.781913072),
        (-11.47866882, -2.286, -7.781913072),
        (-1, 2.286, 13.831775336),
        (-1, -2.286, 13.831775336),
        (17.006931622, 2.286, -11.354272778),
        (17.006931622, -2.286, -11.354272778),
        (18.336554478, 2.286, -9.051298436),
        (18.336554478, -2.286, -9.051298436),
        (-18.336554478, 2.286, -9.051298436),
        (-18.336554478, -2.286, -9.051298436),
        (-17.006931622, 2.286, -11.354272778),
        (-17.006931622, -2.286, -11.354272778),
        (1.329622856, 2.286, 20.405571214),
        (1.329622856, -2.286, 20.405571214),
        (-1.329622856, 2.286, 20.405571214),
        (-1.329622856, -2.286, 20.405571214),
        (11.47866882, 2.286, -7.781913072),
        (11.47866882, -2.286, -7.781913072),
        (0, 2.286, -5),
        (0, -2.286, -5),
        (4.330127019, 2.286, 2.5),
        (4.330127019, -2.286, 2.5),
        (1, 2.286, 13.831775336),
        (1, -2.286, 13.831775336),
        (-4.330127019, 2.286, 2.5),
        (-4.330127019, -2.286, 2.5),
        (-12.47866882, 2.286, -6.049862264),
        (-12.47866882, -2.286, -6.049862264),
        (4.227779535, 2.286, -4.205135088),
        (4.227779535, -2.286, -4.205135088),
        (-4.227779535, 2.286, -4.205135088),
        (-4.227779535, -2.286, -4.205135088),
        (5.75564358, 2.286, -1.558796935),
        (5.75564358, -2.286, -1.558796935),
        (1.527864045, 2.286, 5.763932023),
        (1.527864045, -2.286, 5.763932023),
        (-1.527864045, 2.286, 5.763932023),
        (-1.527864045, -2.286, 5.763932023),
        (-5.75564358, 2.286, -1.558796935),
        (-5.75564358, -2.286, -1.558796935),
        (0, 2.286, -20.765),
        (0, -2.286, -20.765),
    ]]
    chamfer(chamfer2_edges, length=CHAMFER2_SIZE)

    # Chamfer3
    chamfer3_edges = [part.edges().sort_by_distance(p)[0] for p in [
        (0, -2.286, -24.765),
        (0, 2.286, -24.765),
    ]]
    chamfer(chamfer3_edges, length=CHAMFER3_SIZE)


solid = part.part
